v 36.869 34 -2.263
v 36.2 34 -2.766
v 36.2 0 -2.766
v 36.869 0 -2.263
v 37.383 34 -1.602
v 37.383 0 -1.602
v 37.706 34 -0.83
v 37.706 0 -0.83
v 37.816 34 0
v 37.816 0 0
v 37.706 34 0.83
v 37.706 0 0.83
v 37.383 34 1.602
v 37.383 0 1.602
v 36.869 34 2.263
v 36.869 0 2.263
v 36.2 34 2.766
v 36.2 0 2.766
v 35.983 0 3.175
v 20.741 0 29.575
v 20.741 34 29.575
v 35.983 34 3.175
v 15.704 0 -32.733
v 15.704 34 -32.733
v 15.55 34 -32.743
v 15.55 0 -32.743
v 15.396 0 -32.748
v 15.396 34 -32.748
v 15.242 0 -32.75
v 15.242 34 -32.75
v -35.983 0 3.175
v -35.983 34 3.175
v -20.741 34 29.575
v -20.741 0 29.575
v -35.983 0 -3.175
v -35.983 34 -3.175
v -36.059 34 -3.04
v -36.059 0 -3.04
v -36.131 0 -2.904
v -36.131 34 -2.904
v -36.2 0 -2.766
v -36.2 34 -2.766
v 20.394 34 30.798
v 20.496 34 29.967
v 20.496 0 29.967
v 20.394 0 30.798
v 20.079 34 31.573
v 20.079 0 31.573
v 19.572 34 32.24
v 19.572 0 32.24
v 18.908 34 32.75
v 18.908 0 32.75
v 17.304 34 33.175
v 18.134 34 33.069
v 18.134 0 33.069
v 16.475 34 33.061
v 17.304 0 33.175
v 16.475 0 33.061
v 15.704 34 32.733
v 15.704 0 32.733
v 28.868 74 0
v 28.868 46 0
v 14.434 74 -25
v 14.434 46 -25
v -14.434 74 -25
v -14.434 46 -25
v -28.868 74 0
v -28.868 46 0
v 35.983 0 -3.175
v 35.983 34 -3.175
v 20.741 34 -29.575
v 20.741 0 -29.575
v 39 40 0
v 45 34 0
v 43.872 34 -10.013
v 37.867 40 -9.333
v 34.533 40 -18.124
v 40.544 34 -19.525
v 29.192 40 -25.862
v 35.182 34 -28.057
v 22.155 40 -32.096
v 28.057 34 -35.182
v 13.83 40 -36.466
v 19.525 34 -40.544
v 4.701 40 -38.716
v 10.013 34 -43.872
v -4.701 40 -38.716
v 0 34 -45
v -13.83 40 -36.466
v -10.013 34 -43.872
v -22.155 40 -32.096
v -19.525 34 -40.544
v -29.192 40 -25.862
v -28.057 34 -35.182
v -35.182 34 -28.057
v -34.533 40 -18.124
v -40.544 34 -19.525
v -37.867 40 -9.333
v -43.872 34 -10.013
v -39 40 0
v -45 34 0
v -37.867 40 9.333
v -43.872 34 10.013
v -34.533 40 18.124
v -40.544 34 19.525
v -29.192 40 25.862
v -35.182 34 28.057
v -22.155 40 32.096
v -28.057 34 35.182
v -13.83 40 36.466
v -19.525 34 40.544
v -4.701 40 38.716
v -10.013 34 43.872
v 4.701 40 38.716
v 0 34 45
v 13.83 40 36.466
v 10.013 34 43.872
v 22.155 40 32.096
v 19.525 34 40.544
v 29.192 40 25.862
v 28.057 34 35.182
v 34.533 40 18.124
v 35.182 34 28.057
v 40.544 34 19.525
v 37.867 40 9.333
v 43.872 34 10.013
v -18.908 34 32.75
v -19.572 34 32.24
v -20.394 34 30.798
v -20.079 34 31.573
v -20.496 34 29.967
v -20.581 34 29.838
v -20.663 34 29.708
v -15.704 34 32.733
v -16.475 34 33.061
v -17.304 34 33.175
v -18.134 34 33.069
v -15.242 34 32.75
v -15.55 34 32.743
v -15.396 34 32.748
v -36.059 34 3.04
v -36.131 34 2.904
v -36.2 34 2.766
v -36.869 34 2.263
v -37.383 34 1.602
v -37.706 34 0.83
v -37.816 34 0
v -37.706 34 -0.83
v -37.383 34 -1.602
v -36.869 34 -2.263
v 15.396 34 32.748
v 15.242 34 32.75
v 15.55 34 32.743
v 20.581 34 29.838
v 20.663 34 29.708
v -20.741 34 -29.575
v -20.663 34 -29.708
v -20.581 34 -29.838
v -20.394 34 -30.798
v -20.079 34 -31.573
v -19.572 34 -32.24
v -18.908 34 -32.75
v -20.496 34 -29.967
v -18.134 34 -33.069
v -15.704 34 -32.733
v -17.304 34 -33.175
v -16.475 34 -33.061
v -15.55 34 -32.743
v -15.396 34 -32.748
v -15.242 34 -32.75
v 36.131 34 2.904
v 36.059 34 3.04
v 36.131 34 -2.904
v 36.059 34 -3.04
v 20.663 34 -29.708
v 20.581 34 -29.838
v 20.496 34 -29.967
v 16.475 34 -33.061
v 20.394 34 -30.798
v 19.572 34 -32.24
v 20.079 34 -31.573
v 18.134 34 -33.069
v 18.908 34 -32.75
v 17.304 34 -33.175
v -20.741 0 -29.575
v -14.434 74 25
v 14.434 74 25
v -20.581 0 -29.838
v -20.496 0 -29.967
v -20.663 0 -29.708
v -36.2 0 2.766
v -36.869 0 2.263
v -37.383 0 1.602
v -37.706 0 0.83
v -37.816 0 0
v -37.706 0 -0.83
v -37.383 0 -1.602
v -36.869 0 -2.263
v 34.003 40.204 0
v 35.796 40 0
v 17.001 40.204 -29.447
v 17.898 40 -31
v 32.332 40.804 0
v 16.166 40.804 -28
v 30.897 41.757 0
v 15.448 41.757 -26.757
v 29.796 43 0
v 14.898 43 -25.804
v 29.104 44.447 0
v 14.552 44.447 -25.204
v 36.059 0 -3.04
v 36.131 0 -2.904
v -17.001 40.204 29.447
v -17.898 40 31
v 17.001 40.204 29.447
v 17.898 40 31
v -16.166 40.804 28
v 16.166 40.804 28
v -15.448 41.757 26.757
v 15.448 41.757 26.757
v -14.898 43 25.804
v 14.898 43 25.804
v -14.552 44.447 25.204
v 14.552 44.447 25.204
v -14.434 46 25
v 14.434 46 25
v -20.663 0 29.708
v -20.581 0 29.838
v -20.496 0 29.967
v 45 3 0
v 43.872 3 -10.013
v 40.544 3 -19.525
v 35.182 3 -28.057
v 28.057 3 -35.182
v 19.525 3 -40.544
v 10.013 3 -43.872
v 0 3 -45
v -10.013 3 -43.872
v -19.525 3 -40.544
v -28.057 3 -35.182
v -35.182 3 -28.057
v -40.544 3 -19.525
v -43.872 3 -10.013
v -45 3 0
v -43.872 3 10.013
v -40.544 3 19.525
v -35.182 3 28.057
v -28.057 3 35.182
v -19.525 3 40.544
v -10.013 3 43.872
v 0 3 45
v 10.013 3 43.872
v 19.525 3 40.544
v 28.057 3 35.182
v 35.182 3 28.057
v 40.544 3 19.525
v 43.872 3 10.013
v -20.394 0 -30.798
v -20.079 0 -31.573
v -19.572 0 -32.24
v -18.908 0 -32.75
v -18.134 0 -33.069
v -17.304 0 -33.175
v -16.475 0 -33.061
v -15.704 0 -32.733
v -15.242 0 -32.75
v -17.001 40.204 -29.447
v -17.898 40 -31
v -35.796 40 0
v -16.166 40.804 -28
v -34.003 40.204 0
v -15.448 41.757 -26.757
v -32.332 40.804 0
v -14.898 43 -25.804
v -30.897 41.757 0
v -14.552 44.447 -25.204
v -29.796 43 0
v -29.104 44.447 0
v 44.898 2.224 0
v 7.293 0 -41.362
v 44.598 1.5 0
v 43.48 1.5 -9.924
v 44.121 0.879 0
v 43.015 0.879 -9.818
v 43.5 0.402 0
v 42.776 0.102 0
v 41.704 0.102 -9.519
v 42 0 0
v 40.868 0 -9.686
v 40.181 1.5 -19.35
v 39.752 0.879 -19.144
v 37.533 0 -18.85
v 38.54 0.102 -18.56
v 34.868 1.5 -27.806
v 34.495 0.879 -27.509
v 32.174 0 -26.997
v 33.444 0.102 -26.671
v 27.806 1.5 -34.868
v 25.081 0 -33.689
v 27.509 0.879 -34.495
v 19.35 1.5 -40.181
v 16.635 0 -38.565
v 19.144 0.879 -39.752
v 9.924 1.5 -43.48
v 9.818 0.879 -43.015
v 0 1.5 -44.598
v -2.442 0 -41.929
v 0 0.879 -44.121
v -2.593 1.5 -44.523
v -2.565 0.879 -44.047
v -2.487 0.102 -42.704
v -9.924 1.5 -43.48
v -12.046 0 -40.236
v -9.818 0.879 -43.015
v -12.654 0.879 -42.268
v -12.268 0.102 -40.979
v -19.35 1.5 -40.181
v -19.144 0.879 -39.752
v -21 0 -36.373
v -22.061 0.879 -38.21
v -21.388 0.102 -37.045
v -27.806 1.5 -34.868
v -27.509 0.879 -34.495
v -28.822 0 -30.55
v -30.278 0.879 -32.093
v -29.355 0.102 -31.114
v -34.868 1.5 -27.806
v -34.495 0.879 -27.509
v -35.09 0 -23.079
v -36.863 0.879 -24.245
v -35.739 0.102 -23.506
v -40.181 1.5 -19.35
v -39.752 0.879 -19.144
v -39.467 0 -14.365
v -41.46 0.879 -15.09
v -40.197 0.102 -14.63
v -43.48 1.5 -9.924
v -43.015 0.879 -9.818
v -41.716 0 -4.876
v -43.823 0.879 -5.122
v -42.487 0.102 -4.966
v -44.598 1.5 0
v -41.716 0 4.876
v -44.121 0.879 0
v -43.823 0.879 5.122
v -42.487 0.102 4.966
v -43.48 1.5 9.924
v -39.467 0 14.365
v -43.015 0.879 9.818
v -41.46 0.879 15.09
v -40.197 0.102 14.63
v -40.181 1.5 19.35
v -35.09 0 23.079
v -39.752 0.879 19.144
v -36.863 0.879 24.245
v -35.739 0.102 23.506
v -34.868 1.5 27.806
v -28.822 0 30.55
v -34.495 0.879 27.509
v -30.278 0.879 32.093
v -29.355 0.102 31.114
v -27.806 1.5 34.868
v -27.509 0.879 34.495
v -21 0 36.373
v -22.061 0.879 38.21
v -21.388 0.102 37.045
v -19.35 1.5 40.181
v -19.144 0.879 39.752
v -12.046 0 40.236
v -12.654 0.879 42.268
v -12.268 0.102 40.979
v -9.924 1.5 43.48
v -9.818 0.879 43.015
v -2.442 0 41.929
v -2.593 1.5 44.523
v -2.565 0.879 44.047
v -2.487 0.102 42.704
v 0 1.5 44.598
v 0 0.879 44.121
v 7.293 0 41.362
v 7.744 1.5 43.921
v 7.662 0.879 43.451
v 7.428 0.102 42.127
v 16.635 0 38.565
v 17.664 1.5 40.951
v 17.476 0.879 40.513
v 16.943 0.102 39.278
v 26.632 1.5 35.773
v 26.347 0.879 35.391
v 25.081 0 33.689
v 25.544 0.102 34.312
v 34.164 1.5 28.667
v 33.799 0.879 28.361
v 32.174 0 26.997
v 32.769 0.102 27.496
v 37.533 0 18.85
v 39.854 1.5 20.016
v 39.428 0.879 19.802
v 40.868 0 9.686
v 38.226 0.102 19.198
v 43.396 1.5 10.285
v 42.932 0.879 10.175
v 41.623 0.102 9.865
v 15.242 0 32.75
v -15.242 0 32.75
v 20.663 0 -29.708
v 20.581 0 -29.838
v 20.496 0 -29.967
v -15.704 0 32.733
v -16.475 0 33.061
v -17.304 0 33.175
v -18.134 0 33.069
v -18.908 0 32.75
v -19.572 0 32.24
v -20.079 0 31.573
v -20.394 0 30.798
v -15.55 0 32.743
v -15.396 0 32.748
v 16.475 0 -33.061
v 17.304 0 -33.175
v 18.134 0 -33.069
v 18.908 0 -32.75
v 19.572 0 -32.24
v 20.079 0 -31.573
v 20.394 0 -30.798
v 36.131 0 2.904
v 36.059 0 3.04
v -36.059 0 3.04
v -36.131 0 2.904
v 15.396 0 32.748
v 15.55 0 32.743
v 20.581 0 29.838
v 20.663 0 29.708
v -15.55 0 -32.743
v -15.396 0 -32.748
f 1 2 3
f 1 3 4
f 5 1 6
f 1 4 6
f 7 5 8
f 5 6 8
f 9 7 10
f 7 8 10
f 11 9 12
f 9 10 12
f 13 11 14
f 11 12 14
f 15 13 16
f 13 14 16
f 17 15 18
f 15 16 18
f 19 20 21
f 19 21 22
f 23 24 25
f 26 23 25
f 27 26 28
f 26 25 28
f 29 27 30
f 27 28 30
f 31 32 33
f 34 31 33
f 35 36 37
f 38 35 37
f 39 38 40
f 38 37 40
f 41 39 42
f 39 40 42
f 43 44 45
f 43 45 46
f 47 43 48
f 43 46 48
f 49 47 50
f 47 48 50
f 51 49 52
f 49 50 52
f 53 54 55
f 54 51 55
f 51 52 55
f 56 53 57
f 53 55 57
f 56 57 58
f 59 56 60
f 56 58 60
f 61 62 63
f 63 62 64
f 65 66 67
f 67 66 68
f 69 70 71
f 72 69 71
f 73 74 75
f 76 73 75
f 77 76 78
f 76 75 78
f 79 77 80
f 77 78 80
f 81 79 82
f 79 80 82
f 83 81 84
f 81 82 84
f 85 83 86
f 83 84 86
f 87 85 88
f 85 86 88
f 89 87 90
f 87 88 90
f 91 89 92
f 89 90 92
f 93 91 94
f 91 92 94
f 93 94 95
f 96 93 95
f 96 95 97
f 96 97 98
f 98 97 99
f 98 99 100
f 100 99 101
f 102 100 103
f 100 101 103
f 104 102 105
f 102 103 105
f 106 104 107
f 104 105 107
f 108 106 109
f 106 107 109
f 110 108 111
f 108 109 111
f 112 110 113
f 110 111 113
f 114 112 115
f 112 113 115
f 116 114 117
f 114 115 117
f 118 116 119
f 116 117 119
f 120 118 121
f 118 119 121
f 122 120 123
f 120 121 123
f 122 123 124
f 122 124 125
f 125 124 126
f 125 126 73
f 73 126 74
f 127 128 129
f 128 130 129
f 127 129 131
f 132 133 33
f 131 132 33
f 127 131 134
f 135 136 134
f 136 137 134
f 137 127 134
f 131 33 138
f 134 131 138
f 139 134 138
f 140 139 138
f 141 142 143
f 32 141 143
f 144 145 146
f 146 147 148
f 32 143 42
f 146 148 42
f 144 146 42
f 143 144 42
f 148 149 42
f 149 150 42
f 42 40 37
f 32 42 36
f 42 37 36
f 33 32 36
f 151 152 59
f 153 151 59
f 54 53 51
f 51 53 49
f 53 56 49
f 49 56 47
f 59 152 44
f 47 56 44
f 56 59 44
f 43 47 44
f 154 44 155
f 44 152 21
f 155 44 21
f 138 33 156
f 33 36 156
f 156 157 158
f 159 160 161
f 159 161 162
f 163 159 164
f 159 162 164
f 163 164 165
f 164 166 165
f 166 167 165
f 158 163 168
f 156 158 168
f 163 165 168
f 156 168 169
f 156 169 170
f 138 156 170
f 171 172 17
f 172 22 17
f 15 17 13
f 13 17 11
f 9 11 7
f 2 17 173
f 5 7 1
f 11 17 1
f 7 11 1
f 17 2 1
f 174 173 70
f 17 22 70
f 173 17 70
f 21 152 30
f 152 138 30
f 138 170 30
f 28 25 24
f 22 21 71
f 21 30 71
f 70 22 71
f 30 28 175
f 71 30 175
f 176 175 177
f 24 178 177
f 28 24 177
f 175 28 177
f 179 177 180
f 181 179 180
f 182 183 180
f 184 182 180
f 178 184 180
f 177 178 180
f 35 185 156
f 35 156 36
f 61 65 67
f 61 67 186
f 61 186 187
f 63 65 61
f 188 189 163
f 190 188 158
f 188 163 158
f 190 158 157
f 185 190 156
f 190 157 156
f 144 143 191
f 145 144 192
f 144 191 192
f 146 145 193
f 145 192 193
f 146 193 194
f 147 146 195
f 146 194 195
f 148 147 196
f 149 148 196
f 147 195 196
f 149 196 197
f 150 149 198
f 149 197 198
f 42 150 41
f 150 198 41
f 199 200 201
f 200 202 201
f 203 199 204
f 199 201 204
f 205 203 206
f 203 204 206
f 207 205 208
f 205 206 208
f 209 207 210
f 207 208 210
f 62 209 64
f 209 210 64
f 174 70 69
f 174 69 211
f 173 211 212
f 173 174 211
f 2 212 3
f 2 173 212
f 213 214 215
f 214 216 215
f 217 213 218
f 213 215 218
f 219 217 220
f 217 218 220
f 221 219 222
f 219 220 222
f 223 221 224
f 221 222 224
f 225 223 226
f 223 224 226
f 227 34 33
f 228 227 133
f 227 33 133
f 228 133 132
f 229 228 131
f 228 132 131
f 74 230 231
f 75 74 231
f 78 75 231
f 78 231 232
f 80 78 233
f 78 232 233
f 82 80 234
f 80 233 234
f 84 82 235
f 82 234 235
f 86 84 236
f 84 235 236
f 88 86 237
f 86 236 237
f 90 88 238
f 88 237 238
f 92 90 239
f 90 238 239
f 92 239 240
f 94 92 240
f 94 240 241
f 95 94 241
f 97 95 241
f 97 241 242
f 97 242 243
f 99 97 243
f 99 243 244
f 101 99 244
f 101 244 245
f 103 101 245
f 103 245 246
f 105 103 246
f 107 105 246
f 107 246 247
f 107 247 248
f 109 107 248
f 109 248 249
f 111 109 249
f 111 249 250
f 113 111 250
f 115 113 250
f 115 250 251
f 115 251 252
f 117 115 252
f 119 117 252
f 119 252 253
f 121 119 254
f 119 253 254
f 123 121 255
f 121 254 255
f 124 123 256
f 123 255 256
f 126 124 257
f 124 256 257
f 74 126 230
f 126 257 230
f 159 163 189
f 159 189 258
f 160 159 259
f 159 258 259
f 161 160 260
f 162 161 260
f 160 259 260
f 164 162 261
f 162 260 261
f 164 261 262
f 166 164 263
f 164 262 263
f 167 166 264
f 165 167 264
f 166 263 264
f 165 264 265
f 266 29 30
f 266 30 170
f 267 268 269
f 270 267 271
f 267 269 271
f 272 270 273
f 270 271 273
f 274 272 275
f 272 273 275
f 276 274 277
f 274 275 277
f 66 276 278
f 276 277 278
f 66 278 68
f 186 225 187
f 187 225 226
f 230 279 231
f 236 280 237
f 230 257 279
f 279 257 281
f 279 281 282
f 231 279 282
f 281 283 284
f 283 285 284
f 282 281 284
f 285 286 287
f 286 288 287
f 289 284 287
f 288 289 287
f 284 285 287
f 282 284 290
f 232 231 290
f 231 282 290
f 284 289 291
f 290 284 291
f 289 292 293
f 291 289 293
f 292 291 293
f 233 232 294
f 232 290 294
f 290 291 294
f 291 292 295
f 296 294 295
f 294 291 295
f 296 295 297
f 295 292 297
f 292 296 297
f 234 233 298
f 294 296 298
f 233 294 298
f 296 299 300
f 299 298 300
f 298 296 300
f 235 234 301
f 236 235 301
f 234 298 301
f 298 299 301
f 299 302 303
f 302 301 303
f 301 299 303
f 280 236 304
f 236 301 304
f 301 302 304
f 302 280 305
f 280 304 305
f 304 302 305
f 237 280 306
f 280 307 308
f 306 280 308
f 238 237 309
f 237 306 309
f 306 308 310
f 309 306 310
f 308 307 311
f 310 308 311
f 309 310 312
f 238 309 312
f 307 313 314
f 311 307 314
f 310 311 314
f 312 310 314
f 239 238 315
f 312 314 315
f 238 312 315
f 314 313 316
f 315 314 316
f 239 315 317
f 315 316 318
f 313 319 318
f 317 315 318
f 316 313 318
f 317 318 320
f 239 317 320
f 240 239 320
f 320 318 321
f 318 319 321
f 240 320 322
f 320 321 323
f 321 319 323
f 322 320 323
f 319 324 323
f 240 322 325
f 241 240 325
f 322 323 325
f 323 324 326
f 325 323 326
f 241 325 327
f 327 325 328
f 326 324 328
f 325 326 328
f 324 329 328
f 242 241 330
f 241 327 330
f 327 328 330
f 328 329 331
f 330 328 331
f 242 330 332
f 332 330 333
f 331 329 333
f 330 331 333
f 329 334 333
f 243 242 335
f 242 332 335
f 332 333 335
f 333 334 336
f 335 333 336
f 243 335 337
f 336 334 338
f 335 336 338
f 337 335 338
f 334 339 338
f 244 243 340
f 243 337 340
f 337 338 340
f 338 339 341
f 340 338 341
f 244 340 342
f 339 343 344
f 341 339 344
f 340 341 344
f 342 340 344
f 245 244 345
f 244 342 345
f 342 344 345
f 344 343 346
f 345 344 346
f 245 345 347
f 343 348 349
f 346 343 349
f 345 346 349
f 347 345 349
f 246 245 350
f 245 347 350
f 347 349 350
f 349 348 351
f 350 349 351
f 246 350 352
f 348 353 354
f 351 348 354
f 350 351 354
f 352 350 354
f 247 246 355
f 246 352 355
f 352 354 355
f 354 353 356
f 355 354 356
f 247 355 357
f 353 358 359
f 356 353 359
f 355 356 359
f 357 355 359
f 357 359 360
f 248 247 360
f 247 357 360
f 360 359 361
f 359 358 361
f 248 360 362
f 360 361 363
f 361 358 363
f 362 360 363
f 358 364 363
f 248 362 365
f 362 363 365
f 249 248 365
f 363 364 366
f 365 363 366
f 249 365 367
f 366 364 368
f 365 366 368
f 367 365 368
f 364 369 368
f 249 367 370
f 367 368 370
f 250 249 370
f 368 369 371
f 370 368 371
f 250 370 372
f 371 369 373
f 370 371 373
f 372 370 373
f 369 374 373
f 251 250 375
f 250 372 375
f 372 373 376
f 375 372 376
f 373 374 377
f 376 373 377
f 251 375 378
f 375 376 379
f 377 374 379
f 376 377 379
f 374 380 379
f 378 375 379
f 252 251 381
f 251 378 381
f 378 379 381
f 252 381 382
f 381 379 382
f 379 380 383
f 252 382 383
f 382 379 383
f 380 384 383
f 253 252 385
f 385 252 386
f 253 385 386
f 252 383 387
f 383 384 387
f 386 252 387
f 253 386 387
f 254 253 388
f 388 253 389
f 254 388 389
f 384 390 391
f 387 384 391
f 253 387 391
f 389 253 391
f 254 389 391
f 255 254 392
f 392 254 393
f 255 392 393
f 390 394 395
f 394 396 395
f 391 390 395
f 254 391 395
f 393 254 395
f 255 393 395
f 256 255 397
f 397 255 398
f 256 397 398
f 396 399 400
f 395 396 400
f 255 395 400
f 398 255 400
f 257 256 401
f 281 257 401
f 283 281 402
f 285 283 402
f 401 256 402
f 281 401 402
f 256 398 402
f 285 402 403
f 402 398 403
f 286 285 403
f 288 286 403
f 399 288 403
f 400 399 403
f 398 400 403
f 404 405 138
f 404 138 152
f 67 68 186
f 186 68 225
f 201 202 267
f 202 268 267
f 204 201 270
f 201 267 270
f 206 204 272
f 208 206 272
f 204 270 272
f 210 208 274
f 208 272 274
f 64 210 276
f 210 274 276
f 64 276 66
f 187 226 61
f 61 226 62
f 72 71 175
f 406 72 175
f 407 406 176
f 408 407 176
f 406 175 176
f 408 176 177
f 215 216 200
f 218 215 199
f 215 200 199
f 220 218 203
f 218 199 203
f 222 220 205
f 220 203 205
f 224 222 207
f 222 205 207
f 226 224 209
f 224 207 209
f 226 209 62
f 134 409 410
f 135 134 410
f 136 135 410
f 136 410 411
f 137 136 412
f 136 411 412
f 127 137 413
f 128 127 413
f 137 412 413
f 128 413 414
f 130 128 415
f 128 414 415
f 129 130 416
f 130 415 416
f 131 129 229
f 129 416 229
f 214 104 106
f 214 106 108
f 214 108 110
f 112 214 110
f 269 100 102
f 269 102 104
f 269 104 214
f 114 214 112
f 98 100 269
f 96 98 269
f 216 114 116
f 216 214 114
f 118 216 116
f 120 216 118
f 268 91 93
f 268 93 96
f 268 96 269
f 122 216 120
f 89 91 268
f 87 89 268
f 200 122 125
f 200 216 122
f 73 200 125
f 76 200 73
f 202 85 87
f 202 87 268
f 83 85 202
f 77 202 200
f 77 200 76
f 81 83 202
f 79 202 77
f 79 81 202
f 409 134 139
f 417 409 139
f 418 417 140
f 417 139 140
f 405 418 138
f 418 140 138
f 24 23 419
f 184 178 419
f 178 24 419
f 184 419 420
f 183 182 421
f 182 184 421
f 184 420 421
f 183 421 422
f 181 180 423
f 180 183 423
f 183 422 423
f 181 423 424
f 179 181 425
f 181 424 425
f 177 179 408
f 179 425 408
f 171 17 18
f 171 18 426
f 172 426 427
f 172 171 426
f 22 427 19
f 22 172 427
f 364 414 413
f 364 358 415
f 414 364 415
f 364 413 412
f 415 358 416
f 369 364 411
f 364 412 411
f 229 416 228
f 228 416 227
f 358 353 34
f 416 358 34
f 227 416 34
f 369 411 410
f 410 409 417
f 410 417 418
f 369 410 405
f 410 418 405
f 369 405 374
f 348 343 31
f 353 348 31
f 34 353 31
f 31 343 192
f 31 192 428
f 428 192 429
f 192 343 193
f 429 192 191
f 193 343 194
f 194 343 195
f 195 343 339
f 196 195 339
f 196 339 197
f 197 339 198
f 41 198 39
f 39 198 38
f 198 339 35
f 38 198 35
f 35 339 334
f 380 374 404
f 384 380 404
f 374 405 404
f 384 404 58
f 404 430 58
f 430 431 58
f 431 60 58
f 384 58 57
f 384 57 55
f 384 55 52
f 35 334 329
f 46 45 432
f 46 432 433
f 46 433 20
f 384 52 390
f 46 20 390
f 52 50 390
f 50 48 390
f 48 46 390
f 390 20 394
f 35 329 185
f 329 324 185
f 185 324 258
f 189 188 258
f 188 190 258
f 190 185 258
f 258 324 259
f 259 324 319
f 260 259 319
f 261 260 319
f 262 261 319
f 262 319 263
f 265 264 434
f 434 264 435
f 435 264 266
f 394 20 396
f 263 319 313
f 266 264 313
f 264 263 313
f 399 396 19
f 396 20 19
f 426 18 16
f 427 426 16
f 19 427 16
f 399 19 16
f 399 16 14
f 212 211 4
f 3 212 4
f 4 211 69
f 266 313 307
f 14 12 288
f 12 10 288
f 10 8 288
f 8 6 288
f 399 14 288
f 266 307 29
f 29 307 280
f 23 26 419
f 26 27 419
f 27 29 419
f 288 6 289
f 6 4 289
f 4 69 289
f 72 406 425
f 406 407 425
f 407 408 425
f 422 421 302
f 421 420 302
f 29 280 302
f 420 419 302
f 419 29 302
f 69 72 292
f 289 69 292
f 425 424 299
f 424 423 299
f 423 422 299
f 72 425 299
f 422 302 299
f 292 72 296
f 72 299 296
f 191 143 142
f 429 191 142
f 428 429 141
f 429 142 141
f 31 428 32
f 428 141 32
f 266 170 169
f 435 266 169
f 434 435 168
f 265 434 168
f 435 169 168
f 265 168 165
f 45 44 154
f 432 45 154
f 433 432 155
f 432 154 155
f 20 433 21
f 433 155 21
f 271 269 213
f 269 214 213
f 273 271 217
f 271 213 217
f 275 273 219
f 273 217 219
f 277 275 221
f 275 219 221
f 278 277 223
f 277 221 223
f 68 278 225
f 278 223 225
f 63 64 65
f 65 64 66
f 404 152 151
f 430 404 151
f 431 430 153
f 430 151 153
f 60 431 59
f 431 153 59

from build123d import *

# Parameters (mm, degrees)
SKETCH1_R           = 45
BOSS_EXTRUDE1_DEPTH = 34
SKETCH2_R           = 45
BOSS_EXTRUDE2_DEPTH = 6
BOSS_EXTRUDE3_DEPTH = 34
FILLET1_R           = 6
CHAMFER1_SIZE       = 6
FILLET2_R           = 3
FILLET3_R           = 6.35
SKETCH4_R           = 3.175
CUT_EXTRUDE1_DEPTH  = 34


with BuildPart() as part:
    # Sketch1 → Boss-Extrude1 (new body)
    with BuildSketch(Plane(origin=(0, 0, 0), x_dir=(1, 0, 0), z_dir=(0, 1, 0))):
        Circle(SKETCH1_R)
        Polygon((37.816442632, 0), (18.908221316, 32.75), (-18.908221316, 32.75), (-37.816442632, 0), (-18.908221316, -32.75), (18.908221316, -32.75), align=None, mode=Mode.SUBTRACT)
    extrude(amount=BOSS_EXTRUDE1_DEPTH)

    # Sketch2 → Boss-Extrude2 (add)
    with BuildSketch(Plane(origin=(0, 34, 0), x_dir=(1, 0, 0), z_dir=(0, 1, 0))):
        Circle(SKETCH2_R)
    extrude(amount=BOSS_EXTRUDE2_DEPTH)

    # Sketch3 → Boss-Extrude3 (add)
    with BuildSketch(Plane(origin=(0, 40, 0), x_dir=(1, 0, 0), z_dir=(0, 1, 0))):
        Polygon((28.867513459, 0), (14.43375673, 25), (-14.43375673, 25), (-28.867513459, 0), (-14.43375673, -25), (14.43375673, -25), align=None)
    extrude(amount=BOSS_EXTRUDE3_DEPTH)

    # Fillet1
    fillet1_edges = [part.edges().sort_by_distance(p)[0] for p in [
        (21.650635095, 40, 12.5),
        (21.650635095, 40, -12.5),
        (0, 40, -25),
        (-21.650635095, 40, -12.5),
        (-21.650635095, 40, 12.5),
        (0, 40, 25),
    ]]
    fillet(fillet1_edges, radius=FILLET1_R)

    # Chamfer1
    chamfer1_edges = [part.edges().sort_by_distance(p)[0] for p in [
        (-45, 40, 0),
    ]]
    chamfer(chamfer1_edges, length=CHAMFER1_SIZE)

    # Fillet2
    fillet2_edges = [part.edges().sort_by_distance(p)[0] for p in [
        (-45, 0, 0),
    ]]
    fillet(fillet2_edges, radius=FILLET2_R)

    # Fillet3
    fillet3_edges = [part.edges().sort_by_distance(p)[0] for p in [
        (37.816442632, 17, 0),
        (18.908221316, 17, -32.75),
        (-18.908221316, 17, -32.75),
        (-37.816442632, 17, 0),
        (-18.908221316, 17, 32.75),
        (18.908221316, 17, 32.75),
    ]]
    fillet(fillet3_edges, radius=FILLET3_R)

    # Sketch4 → Cut-Extrude1 (cut)
    with BuildSketch(Plane.XZ):
        with Locations((17.320721316, 30.000369343)):
            Circle(SKETCH4_R)
        with Locations((34.641442632, 0)):
            Circle(SKETCH4_R)
        with Locations((17.320721316, -30.000369343)):
            Circle(SKETCH4_R)
        with Locations((-17.320721316, -30.000369343)):
            Circle(SKETCH4_R)
        with Locations((-34.641442632, 0)):
            Circle(SKETCH4_R)
        with Locations((-17.320721316, 30.000369343)):
            Circle(SKETCH4_R)
    extrude(amount=-CUT_EXTRUDE1_DEPTH, mode=Mode.SUBTRACT)


solid = part.part
